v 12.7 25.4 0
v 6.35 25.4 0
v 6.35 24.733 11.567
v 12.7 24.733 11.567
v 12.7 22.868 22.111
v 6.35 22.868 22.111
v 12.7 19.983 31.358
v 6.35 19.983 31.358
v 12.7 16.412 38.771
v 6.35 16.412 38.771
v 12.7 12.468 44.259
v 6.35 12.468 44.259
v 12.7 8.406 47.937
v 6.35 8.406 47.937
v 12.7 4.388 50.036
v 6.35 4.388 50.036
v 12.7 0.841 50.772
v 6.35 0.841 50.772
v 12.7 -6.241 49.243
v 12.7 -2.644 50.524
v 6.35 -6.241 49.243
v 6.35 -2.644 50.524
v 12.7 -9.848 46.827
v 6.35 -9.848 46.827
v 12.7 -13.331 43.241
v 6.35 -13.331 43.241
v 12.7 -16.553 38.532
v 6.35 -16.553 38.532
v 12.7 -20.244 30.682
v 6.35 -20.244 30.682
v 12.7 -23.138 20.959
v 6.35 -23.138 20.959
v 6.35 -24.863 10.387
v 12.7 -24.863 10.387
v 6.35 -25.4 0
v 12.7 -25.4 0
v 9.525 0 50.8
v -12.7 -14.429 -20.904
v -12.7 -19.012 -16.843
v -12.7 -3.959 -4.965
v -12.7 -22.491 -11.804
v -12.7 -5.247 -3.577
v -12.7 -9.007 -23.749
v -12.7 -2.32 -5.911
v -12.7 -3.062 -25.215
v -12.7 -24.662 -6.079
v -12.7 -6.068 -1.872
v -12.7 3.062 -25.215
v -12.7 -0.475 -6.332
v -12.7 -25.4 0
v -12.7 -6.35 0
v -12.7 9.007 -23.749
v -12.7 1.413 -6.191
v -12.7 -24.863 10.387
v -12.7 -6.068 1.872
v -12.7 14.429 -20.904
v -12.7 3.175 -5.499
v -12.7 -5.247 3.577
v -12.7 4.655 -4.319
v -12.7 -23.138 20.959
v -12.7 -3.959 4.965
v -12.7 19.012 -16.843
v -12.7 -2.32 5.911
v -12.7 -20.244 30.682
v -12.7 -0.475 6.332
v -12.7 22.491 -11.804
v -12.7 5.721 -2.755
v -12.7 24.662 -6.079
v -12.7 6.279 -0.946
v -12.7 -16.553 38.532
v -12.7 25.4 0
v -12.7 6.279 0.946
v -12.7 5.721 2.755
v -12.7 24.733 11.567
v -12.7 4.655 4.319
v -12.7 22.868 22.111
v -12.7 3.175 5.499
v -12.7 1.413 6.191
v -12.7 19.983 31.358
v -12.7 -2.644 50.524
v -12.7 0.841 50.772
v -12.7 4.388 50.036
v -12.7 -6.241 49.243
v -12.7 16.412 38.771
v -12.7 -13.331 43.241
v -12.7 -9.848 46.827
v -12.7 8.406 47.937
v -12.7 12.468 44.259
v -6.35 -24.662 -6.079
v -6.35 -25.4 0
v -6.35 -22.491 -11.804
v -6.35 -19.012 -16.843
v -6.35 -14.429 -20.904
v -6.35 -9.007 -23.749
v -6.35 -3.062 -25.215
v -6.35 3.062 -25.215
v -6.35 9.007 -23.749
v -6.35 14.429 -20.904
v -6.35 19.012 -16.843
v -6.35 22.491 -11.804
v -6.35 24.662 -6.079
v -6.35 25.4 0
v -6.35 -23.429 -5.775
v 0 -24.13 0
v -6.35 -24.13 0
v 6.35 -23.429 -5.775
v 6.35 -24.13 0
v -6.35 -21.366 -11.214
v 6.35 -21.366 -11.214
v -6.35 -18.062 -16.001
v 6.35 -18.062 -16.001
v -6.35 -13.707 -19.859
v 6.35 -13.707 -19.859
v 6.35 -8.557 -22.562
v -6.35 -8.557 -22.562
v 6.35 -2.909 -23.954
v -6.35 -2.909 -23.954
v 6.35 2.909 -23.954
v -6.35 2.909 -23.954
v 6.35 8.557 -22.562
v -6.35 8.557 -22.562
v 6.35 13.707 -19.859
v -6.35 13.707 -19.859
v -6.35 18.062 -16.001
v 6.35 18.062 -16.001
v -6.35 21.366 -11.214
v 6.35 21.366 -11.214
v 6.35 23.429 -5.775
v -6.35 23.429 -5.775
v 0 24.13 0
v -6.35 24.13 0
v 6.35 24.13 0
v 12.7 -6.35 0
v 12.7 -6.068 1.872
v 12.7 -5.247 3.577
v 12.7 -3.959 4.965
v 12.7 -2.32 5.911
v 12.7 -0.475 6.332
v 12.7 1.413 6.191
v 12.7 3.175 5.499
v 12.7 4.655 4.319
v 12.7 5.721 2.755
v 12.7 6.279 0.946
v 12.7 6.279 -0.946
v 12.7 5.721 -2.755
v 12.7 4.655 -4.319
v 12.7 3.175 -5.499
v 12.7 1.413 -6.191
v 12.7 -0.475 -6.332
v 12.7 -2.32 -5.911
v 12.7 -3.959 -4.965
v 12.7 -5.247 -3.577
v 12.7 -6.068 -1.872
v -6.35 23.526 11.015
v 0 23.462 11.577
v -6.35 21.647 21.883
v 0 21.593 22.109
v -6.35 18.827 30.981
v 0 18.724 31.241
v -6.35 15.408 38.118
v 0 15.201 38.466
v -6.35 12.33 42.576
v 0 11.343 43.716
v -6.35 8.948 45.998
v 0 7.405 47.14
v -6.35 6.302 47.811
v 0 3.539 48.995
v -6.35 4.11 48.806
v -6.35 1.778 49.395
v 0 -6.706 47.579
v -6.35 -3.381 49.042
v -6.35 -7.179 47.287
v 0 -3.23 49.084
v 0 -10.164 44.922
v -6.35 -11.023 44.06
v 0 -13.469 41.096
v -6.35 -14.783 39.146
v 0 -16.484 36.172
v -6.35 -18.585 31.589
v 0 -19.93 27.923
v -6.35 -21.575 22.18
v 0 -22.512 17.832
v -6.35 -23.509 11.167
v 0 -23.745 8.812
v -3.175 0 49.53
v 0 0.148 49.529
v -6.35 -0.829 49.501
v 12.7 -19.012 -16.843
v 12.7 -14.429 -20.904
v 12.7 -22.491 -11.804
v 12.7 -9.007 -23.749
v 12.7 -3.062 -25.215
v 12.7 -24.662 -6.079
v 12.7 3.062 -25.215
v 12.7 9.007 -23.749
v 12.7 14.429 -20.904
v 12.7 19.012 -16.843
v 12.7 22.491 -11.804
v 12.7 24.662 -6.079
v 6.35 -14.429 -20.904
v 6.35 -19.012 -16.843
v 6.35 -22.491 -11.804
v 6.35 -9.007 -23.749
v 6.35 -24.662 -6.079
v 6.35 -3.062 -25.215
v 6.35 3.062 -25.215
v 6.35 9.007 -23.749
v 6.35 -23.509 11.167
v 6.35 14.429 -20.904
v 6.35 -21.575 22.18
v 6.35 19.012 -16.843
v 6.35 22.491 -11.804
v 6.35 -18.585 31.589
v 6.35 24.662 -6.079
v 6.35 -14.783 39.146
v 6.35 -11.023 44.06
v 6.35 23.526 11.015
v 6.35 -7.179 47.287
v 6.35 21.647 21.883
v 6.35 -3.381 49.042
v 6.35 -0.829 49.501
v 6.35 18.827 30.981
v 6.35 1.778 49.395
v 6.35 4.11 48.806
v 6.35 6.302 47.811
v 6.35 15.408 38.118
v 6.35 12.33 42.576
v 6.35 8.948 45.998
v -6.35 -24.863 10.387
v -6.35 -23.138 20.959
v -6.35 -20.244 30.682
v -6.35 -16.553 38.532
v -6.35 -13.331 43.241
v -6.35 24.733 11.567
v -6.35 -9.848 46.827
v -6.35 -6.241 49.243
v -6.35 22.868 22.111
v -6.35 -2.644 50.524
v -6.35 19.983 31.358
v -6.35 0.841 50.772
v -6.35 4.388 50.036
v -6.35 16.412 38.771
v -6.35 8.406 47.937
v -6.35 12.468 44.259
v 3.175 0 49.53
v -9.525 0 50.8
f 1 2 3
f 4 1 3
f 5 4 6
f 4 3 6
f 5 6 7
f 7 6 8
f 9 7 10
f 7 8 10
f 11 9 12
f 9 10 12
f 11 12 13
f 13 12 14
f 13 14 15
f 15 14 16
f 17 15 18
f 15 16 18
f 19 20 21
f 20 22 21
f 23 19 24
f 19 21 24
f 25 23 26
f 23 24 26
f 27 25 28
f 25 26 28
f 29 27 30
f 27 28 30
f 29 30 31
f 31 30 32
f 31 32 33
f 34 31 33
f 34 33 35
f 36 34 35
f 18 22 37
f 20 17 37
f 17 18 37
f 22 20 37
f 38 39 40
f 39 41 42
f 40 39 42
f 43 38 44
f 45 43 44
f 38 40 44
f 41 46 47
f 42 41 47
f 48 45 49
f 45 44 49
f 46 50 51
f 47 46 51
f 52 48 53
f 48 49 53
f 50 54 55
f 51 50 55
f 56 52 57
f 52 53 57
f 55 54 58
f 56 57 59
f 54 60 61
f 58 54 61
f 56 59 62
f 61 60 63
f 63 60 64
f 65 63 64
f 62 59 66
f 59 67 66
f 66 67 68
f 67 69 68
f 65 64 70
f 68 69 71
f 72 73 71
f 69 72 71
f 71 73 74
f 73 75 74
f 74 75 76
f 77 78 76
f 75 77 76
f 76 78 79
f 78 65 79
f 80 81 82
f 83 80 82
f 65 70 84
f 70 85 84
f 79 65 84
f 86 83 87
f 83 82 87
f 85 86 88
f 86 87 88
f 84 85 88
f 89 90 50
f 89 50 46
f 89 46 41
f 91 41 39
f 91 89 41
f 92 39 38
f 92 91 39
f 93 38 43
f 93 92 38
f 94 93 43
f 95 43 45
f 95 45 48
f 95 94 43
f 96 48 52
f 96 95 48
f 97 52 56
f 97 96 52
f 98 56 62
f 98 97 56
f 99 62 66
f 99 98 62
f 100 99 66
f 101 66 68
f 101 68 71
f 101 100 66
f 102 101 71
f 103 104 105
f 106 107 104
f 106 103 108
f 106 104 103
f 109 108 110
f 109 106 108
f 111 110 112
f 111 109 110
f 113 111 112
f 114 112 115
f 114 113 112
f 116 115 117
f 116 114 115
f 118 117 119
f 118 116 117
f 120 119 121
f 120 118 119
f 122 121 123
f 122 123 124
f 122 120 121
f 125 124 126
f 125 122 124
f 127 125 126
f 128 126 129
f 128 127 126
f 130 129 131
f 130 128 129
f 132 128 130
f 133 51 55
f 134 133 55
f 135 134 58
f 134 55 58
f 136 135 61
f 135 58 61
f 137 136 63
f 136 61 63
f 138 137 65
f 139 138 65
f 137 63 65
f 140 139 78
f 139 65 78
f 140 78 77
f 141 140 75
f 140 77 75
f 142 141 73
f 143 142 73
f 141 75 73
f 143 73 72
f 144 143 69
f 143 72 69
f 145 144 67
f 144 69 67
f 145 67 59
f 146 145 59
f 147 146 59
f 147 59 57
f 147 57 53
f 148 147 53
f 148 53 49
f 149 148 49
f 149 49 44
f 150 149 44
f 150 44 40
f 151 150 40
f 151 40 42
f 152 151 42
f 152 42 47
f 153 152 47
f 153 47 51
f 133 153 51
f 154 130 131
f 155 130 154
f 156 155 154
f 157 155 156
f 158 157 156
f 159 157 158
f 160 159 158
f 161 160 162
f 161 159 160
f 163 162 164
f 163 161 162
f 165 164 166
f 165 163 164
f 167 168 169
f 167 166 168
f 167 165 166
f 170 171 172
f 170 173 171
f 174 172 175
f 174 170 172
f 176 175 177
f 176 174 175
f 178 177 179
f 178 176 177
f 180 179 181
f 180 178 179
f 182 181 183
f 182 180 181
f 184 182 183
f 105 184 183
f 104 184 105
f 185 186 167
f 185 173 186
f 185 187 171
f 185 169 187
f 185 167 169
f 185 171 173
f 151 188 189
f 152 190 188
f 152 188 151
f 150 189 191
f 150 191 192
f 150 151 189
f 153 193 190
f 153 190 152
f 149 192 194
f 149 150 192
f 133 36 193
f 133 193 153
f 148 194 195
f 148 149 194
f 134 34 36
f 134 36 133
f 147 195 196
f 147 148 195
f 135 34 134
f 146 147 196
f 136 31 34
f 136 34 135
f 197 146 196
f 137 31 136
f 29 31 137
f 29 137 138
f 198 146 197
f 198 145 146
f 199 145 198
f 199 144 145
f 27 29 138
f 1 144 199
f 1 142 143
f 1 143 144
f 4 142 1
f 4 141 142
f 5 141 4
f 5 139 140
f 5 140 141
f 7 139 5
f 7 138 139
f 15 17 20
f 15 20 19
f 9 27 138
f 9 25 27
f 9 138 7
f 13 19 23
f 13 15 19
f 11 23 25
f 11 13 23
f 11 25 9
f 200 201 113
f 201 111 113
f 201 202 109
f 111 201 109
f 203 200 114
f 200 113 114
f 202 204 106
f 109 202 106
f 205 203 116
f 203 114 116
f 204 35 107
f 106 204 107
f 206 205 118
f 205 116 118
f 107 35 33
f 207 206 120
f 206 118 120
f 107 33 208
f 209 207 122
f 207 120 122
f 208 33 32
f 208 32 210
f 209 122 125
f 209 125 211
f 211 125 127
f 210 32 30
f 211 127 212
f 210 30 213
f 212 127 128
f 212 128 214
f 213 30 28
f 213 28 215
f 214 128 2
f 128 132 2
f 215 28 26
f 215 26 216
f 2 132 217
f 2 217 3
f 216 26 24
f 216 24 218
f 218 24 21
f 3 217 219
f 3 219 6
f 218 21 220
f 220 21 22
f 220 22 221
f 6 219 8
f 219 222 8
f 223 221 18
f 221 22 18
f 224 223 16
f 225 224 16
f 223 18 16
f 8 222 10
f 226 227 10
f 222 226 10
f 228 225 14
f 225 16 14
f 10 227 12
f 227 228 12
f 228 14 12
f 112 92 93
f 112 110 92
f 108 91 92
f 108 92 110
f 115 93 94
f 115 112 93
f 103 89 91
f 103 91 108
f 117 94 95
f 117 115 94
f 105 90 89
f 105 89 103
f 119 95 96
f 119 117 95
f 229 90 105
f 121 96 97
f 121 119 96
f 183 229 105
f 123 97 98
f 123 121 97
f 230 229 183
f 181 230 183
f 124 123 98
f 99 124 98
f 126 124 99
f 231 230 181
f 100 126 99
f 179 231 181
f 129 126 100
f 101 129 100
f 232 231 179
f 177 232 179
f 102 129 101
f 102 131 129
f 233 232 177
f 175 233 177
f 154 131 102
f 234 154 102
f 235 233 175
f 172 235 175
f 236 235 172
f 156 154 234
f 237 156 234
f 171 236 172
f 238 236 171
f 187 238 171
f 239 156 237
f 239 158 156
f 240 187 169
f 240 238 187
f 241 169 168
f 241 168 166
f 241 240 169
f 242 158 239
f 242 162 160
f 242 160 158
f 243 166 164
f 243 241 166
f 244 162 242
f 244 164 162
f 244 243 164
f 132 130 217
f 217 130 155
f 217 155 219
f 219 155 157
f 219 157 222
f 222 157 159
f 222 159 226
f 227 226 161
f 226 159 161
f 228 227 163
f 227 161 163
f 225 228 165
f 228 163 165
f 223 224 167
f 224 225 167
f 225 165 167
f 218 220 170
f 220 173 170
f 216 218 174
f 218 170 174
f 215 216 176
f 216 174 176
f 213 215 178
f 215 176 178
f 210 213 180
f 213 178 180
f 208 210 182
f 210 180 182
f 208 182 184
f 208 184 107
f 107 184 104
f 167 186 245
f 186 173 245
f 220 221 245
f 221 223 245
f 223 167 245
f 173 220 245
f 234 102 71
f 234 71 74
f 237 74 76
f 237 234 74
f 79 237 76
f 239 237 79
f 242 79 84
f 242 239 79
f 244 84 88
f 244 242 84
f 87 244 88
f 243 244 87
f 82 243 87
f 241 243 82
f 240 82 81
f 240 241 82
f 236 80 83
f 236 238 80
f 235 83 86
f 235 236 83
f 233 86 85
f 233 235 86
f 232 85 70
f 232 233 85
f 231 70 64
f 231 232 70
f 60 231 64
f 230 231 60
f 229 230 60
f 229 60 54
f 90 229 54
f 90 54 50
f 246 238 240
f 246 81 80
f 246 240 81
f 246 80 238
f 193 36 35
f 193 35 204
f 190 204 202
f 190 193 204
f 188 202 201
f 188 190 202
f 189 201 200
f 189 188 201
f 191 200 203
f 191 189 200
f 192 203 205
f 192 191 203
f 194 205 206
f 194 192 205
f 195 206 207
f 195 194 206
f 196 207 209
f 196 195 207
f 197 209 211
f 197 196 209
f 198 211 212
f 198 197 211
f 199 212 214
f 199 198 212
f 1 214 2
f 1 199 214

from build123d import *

# Parameters (mm, degrees)
F1_DEPTH = 12.7
F3_DEPTH = 6.35
F5_DEPTH = 7.62
F6_R     = 6.35
F7_DEPTH = 25.4010001


with BuildPart() as f1:
    # F0 (on Right) → F1 (new body, symmetric)
    with BuildSketch(Plane.YZ):
        with BuildLine():
            ThreePointArc((-25.4, 0), (0, -25.4), (25.4, 0))
            ThreePointArc((25.4, 0), (0, 25.4), (-25.4, 0))
        make_face()
        with BuildLine():
            ThreePointArc((-25.4, 0), (0, 25.4), (25.4, 0))
            add(Edge.make_bspline(
                [(25.4, 0), (25.4, 50.8), (0, 50.8), (-25.4, 50.8), (-25.4, 0)],
                knots=[4.7123889804, 4.7123889804, 4.7123889804, 6.2831853072, 6.2831853072, 7.853981634, 7.853981634, 7.853981634], degree=2, weights=[1, 0.7071067812, 1, 0.7071067812, 1]))
        make_face()
    extrude(amount=F1_DEPTH, both=True)

    # F2 (on Right) → F3 (cut, symmetric)
    with BuildSketch(Plane.YZ):
        with BuildLine():
            ThreePointArc((-25.4, 0), (0, -25.4), (25.4, 0))
            add(Edge.make_bspline(
                [(25.4, 0), (25.4, 50.8), (0, 50.8), (-25.4, 50.8), (-25.4, 0)],
                knots=[4.7123889804, 4.7123889804, 4.7123889804, 6.2831853072, 6.2831853072, 7.853981634, 7.853981634, 7.853981634], degree=2, weights=[1, 0.7071067812, 1, 0.7071067812, 1]))
        make_face()
    extrude(amount=F3_DEPTH, both=True, mode=Mode.SUBTRACT)

    # F4 (on Right) → F5 (join, symmetric)
    with BuildSketch(Plane.YZ):
        with BuildLine():
            ThreePointArc((-24.13, 0), (0, -24.13), (24.13, 0))
            ThreePointArc((24.13, 0), (0, 24.13), (-24.13, 0))
        make_face()
        with BuildLine():
            ThreePointArc((-24.13, 0), (0, 24.13), (24.13, 0))
            add(Edge.make_bspline(
                [(24.13, 0), (24.13, 49.53), (0, 49.53), (-24.13, 49.53), (-24.13, 0)],
                knots=[4.7123889804, 4.7123889804, 4.7123889804, 6.2831853072, 6.2831853072, 7.853981634, 7.853981634, 7.853981634], degree=2, weights=[1, 0.7071067812, 1, 0.7071067812, 1]))
        make_face()
    extrude(amount=F5_DEPTH, both=True)

    # F6 (on face) → F7 (cut, through all)
    with BuildSketch(Plane(origin=(-12.7, 0, 0), x_dir=(0, -1, 0), z_dir=(-1, 0, 0))):
        Circle(F6_R)
    extrude(amount=-F7_DEPTH, mode=Mode.SUBTRACT)


solid = f1.part
